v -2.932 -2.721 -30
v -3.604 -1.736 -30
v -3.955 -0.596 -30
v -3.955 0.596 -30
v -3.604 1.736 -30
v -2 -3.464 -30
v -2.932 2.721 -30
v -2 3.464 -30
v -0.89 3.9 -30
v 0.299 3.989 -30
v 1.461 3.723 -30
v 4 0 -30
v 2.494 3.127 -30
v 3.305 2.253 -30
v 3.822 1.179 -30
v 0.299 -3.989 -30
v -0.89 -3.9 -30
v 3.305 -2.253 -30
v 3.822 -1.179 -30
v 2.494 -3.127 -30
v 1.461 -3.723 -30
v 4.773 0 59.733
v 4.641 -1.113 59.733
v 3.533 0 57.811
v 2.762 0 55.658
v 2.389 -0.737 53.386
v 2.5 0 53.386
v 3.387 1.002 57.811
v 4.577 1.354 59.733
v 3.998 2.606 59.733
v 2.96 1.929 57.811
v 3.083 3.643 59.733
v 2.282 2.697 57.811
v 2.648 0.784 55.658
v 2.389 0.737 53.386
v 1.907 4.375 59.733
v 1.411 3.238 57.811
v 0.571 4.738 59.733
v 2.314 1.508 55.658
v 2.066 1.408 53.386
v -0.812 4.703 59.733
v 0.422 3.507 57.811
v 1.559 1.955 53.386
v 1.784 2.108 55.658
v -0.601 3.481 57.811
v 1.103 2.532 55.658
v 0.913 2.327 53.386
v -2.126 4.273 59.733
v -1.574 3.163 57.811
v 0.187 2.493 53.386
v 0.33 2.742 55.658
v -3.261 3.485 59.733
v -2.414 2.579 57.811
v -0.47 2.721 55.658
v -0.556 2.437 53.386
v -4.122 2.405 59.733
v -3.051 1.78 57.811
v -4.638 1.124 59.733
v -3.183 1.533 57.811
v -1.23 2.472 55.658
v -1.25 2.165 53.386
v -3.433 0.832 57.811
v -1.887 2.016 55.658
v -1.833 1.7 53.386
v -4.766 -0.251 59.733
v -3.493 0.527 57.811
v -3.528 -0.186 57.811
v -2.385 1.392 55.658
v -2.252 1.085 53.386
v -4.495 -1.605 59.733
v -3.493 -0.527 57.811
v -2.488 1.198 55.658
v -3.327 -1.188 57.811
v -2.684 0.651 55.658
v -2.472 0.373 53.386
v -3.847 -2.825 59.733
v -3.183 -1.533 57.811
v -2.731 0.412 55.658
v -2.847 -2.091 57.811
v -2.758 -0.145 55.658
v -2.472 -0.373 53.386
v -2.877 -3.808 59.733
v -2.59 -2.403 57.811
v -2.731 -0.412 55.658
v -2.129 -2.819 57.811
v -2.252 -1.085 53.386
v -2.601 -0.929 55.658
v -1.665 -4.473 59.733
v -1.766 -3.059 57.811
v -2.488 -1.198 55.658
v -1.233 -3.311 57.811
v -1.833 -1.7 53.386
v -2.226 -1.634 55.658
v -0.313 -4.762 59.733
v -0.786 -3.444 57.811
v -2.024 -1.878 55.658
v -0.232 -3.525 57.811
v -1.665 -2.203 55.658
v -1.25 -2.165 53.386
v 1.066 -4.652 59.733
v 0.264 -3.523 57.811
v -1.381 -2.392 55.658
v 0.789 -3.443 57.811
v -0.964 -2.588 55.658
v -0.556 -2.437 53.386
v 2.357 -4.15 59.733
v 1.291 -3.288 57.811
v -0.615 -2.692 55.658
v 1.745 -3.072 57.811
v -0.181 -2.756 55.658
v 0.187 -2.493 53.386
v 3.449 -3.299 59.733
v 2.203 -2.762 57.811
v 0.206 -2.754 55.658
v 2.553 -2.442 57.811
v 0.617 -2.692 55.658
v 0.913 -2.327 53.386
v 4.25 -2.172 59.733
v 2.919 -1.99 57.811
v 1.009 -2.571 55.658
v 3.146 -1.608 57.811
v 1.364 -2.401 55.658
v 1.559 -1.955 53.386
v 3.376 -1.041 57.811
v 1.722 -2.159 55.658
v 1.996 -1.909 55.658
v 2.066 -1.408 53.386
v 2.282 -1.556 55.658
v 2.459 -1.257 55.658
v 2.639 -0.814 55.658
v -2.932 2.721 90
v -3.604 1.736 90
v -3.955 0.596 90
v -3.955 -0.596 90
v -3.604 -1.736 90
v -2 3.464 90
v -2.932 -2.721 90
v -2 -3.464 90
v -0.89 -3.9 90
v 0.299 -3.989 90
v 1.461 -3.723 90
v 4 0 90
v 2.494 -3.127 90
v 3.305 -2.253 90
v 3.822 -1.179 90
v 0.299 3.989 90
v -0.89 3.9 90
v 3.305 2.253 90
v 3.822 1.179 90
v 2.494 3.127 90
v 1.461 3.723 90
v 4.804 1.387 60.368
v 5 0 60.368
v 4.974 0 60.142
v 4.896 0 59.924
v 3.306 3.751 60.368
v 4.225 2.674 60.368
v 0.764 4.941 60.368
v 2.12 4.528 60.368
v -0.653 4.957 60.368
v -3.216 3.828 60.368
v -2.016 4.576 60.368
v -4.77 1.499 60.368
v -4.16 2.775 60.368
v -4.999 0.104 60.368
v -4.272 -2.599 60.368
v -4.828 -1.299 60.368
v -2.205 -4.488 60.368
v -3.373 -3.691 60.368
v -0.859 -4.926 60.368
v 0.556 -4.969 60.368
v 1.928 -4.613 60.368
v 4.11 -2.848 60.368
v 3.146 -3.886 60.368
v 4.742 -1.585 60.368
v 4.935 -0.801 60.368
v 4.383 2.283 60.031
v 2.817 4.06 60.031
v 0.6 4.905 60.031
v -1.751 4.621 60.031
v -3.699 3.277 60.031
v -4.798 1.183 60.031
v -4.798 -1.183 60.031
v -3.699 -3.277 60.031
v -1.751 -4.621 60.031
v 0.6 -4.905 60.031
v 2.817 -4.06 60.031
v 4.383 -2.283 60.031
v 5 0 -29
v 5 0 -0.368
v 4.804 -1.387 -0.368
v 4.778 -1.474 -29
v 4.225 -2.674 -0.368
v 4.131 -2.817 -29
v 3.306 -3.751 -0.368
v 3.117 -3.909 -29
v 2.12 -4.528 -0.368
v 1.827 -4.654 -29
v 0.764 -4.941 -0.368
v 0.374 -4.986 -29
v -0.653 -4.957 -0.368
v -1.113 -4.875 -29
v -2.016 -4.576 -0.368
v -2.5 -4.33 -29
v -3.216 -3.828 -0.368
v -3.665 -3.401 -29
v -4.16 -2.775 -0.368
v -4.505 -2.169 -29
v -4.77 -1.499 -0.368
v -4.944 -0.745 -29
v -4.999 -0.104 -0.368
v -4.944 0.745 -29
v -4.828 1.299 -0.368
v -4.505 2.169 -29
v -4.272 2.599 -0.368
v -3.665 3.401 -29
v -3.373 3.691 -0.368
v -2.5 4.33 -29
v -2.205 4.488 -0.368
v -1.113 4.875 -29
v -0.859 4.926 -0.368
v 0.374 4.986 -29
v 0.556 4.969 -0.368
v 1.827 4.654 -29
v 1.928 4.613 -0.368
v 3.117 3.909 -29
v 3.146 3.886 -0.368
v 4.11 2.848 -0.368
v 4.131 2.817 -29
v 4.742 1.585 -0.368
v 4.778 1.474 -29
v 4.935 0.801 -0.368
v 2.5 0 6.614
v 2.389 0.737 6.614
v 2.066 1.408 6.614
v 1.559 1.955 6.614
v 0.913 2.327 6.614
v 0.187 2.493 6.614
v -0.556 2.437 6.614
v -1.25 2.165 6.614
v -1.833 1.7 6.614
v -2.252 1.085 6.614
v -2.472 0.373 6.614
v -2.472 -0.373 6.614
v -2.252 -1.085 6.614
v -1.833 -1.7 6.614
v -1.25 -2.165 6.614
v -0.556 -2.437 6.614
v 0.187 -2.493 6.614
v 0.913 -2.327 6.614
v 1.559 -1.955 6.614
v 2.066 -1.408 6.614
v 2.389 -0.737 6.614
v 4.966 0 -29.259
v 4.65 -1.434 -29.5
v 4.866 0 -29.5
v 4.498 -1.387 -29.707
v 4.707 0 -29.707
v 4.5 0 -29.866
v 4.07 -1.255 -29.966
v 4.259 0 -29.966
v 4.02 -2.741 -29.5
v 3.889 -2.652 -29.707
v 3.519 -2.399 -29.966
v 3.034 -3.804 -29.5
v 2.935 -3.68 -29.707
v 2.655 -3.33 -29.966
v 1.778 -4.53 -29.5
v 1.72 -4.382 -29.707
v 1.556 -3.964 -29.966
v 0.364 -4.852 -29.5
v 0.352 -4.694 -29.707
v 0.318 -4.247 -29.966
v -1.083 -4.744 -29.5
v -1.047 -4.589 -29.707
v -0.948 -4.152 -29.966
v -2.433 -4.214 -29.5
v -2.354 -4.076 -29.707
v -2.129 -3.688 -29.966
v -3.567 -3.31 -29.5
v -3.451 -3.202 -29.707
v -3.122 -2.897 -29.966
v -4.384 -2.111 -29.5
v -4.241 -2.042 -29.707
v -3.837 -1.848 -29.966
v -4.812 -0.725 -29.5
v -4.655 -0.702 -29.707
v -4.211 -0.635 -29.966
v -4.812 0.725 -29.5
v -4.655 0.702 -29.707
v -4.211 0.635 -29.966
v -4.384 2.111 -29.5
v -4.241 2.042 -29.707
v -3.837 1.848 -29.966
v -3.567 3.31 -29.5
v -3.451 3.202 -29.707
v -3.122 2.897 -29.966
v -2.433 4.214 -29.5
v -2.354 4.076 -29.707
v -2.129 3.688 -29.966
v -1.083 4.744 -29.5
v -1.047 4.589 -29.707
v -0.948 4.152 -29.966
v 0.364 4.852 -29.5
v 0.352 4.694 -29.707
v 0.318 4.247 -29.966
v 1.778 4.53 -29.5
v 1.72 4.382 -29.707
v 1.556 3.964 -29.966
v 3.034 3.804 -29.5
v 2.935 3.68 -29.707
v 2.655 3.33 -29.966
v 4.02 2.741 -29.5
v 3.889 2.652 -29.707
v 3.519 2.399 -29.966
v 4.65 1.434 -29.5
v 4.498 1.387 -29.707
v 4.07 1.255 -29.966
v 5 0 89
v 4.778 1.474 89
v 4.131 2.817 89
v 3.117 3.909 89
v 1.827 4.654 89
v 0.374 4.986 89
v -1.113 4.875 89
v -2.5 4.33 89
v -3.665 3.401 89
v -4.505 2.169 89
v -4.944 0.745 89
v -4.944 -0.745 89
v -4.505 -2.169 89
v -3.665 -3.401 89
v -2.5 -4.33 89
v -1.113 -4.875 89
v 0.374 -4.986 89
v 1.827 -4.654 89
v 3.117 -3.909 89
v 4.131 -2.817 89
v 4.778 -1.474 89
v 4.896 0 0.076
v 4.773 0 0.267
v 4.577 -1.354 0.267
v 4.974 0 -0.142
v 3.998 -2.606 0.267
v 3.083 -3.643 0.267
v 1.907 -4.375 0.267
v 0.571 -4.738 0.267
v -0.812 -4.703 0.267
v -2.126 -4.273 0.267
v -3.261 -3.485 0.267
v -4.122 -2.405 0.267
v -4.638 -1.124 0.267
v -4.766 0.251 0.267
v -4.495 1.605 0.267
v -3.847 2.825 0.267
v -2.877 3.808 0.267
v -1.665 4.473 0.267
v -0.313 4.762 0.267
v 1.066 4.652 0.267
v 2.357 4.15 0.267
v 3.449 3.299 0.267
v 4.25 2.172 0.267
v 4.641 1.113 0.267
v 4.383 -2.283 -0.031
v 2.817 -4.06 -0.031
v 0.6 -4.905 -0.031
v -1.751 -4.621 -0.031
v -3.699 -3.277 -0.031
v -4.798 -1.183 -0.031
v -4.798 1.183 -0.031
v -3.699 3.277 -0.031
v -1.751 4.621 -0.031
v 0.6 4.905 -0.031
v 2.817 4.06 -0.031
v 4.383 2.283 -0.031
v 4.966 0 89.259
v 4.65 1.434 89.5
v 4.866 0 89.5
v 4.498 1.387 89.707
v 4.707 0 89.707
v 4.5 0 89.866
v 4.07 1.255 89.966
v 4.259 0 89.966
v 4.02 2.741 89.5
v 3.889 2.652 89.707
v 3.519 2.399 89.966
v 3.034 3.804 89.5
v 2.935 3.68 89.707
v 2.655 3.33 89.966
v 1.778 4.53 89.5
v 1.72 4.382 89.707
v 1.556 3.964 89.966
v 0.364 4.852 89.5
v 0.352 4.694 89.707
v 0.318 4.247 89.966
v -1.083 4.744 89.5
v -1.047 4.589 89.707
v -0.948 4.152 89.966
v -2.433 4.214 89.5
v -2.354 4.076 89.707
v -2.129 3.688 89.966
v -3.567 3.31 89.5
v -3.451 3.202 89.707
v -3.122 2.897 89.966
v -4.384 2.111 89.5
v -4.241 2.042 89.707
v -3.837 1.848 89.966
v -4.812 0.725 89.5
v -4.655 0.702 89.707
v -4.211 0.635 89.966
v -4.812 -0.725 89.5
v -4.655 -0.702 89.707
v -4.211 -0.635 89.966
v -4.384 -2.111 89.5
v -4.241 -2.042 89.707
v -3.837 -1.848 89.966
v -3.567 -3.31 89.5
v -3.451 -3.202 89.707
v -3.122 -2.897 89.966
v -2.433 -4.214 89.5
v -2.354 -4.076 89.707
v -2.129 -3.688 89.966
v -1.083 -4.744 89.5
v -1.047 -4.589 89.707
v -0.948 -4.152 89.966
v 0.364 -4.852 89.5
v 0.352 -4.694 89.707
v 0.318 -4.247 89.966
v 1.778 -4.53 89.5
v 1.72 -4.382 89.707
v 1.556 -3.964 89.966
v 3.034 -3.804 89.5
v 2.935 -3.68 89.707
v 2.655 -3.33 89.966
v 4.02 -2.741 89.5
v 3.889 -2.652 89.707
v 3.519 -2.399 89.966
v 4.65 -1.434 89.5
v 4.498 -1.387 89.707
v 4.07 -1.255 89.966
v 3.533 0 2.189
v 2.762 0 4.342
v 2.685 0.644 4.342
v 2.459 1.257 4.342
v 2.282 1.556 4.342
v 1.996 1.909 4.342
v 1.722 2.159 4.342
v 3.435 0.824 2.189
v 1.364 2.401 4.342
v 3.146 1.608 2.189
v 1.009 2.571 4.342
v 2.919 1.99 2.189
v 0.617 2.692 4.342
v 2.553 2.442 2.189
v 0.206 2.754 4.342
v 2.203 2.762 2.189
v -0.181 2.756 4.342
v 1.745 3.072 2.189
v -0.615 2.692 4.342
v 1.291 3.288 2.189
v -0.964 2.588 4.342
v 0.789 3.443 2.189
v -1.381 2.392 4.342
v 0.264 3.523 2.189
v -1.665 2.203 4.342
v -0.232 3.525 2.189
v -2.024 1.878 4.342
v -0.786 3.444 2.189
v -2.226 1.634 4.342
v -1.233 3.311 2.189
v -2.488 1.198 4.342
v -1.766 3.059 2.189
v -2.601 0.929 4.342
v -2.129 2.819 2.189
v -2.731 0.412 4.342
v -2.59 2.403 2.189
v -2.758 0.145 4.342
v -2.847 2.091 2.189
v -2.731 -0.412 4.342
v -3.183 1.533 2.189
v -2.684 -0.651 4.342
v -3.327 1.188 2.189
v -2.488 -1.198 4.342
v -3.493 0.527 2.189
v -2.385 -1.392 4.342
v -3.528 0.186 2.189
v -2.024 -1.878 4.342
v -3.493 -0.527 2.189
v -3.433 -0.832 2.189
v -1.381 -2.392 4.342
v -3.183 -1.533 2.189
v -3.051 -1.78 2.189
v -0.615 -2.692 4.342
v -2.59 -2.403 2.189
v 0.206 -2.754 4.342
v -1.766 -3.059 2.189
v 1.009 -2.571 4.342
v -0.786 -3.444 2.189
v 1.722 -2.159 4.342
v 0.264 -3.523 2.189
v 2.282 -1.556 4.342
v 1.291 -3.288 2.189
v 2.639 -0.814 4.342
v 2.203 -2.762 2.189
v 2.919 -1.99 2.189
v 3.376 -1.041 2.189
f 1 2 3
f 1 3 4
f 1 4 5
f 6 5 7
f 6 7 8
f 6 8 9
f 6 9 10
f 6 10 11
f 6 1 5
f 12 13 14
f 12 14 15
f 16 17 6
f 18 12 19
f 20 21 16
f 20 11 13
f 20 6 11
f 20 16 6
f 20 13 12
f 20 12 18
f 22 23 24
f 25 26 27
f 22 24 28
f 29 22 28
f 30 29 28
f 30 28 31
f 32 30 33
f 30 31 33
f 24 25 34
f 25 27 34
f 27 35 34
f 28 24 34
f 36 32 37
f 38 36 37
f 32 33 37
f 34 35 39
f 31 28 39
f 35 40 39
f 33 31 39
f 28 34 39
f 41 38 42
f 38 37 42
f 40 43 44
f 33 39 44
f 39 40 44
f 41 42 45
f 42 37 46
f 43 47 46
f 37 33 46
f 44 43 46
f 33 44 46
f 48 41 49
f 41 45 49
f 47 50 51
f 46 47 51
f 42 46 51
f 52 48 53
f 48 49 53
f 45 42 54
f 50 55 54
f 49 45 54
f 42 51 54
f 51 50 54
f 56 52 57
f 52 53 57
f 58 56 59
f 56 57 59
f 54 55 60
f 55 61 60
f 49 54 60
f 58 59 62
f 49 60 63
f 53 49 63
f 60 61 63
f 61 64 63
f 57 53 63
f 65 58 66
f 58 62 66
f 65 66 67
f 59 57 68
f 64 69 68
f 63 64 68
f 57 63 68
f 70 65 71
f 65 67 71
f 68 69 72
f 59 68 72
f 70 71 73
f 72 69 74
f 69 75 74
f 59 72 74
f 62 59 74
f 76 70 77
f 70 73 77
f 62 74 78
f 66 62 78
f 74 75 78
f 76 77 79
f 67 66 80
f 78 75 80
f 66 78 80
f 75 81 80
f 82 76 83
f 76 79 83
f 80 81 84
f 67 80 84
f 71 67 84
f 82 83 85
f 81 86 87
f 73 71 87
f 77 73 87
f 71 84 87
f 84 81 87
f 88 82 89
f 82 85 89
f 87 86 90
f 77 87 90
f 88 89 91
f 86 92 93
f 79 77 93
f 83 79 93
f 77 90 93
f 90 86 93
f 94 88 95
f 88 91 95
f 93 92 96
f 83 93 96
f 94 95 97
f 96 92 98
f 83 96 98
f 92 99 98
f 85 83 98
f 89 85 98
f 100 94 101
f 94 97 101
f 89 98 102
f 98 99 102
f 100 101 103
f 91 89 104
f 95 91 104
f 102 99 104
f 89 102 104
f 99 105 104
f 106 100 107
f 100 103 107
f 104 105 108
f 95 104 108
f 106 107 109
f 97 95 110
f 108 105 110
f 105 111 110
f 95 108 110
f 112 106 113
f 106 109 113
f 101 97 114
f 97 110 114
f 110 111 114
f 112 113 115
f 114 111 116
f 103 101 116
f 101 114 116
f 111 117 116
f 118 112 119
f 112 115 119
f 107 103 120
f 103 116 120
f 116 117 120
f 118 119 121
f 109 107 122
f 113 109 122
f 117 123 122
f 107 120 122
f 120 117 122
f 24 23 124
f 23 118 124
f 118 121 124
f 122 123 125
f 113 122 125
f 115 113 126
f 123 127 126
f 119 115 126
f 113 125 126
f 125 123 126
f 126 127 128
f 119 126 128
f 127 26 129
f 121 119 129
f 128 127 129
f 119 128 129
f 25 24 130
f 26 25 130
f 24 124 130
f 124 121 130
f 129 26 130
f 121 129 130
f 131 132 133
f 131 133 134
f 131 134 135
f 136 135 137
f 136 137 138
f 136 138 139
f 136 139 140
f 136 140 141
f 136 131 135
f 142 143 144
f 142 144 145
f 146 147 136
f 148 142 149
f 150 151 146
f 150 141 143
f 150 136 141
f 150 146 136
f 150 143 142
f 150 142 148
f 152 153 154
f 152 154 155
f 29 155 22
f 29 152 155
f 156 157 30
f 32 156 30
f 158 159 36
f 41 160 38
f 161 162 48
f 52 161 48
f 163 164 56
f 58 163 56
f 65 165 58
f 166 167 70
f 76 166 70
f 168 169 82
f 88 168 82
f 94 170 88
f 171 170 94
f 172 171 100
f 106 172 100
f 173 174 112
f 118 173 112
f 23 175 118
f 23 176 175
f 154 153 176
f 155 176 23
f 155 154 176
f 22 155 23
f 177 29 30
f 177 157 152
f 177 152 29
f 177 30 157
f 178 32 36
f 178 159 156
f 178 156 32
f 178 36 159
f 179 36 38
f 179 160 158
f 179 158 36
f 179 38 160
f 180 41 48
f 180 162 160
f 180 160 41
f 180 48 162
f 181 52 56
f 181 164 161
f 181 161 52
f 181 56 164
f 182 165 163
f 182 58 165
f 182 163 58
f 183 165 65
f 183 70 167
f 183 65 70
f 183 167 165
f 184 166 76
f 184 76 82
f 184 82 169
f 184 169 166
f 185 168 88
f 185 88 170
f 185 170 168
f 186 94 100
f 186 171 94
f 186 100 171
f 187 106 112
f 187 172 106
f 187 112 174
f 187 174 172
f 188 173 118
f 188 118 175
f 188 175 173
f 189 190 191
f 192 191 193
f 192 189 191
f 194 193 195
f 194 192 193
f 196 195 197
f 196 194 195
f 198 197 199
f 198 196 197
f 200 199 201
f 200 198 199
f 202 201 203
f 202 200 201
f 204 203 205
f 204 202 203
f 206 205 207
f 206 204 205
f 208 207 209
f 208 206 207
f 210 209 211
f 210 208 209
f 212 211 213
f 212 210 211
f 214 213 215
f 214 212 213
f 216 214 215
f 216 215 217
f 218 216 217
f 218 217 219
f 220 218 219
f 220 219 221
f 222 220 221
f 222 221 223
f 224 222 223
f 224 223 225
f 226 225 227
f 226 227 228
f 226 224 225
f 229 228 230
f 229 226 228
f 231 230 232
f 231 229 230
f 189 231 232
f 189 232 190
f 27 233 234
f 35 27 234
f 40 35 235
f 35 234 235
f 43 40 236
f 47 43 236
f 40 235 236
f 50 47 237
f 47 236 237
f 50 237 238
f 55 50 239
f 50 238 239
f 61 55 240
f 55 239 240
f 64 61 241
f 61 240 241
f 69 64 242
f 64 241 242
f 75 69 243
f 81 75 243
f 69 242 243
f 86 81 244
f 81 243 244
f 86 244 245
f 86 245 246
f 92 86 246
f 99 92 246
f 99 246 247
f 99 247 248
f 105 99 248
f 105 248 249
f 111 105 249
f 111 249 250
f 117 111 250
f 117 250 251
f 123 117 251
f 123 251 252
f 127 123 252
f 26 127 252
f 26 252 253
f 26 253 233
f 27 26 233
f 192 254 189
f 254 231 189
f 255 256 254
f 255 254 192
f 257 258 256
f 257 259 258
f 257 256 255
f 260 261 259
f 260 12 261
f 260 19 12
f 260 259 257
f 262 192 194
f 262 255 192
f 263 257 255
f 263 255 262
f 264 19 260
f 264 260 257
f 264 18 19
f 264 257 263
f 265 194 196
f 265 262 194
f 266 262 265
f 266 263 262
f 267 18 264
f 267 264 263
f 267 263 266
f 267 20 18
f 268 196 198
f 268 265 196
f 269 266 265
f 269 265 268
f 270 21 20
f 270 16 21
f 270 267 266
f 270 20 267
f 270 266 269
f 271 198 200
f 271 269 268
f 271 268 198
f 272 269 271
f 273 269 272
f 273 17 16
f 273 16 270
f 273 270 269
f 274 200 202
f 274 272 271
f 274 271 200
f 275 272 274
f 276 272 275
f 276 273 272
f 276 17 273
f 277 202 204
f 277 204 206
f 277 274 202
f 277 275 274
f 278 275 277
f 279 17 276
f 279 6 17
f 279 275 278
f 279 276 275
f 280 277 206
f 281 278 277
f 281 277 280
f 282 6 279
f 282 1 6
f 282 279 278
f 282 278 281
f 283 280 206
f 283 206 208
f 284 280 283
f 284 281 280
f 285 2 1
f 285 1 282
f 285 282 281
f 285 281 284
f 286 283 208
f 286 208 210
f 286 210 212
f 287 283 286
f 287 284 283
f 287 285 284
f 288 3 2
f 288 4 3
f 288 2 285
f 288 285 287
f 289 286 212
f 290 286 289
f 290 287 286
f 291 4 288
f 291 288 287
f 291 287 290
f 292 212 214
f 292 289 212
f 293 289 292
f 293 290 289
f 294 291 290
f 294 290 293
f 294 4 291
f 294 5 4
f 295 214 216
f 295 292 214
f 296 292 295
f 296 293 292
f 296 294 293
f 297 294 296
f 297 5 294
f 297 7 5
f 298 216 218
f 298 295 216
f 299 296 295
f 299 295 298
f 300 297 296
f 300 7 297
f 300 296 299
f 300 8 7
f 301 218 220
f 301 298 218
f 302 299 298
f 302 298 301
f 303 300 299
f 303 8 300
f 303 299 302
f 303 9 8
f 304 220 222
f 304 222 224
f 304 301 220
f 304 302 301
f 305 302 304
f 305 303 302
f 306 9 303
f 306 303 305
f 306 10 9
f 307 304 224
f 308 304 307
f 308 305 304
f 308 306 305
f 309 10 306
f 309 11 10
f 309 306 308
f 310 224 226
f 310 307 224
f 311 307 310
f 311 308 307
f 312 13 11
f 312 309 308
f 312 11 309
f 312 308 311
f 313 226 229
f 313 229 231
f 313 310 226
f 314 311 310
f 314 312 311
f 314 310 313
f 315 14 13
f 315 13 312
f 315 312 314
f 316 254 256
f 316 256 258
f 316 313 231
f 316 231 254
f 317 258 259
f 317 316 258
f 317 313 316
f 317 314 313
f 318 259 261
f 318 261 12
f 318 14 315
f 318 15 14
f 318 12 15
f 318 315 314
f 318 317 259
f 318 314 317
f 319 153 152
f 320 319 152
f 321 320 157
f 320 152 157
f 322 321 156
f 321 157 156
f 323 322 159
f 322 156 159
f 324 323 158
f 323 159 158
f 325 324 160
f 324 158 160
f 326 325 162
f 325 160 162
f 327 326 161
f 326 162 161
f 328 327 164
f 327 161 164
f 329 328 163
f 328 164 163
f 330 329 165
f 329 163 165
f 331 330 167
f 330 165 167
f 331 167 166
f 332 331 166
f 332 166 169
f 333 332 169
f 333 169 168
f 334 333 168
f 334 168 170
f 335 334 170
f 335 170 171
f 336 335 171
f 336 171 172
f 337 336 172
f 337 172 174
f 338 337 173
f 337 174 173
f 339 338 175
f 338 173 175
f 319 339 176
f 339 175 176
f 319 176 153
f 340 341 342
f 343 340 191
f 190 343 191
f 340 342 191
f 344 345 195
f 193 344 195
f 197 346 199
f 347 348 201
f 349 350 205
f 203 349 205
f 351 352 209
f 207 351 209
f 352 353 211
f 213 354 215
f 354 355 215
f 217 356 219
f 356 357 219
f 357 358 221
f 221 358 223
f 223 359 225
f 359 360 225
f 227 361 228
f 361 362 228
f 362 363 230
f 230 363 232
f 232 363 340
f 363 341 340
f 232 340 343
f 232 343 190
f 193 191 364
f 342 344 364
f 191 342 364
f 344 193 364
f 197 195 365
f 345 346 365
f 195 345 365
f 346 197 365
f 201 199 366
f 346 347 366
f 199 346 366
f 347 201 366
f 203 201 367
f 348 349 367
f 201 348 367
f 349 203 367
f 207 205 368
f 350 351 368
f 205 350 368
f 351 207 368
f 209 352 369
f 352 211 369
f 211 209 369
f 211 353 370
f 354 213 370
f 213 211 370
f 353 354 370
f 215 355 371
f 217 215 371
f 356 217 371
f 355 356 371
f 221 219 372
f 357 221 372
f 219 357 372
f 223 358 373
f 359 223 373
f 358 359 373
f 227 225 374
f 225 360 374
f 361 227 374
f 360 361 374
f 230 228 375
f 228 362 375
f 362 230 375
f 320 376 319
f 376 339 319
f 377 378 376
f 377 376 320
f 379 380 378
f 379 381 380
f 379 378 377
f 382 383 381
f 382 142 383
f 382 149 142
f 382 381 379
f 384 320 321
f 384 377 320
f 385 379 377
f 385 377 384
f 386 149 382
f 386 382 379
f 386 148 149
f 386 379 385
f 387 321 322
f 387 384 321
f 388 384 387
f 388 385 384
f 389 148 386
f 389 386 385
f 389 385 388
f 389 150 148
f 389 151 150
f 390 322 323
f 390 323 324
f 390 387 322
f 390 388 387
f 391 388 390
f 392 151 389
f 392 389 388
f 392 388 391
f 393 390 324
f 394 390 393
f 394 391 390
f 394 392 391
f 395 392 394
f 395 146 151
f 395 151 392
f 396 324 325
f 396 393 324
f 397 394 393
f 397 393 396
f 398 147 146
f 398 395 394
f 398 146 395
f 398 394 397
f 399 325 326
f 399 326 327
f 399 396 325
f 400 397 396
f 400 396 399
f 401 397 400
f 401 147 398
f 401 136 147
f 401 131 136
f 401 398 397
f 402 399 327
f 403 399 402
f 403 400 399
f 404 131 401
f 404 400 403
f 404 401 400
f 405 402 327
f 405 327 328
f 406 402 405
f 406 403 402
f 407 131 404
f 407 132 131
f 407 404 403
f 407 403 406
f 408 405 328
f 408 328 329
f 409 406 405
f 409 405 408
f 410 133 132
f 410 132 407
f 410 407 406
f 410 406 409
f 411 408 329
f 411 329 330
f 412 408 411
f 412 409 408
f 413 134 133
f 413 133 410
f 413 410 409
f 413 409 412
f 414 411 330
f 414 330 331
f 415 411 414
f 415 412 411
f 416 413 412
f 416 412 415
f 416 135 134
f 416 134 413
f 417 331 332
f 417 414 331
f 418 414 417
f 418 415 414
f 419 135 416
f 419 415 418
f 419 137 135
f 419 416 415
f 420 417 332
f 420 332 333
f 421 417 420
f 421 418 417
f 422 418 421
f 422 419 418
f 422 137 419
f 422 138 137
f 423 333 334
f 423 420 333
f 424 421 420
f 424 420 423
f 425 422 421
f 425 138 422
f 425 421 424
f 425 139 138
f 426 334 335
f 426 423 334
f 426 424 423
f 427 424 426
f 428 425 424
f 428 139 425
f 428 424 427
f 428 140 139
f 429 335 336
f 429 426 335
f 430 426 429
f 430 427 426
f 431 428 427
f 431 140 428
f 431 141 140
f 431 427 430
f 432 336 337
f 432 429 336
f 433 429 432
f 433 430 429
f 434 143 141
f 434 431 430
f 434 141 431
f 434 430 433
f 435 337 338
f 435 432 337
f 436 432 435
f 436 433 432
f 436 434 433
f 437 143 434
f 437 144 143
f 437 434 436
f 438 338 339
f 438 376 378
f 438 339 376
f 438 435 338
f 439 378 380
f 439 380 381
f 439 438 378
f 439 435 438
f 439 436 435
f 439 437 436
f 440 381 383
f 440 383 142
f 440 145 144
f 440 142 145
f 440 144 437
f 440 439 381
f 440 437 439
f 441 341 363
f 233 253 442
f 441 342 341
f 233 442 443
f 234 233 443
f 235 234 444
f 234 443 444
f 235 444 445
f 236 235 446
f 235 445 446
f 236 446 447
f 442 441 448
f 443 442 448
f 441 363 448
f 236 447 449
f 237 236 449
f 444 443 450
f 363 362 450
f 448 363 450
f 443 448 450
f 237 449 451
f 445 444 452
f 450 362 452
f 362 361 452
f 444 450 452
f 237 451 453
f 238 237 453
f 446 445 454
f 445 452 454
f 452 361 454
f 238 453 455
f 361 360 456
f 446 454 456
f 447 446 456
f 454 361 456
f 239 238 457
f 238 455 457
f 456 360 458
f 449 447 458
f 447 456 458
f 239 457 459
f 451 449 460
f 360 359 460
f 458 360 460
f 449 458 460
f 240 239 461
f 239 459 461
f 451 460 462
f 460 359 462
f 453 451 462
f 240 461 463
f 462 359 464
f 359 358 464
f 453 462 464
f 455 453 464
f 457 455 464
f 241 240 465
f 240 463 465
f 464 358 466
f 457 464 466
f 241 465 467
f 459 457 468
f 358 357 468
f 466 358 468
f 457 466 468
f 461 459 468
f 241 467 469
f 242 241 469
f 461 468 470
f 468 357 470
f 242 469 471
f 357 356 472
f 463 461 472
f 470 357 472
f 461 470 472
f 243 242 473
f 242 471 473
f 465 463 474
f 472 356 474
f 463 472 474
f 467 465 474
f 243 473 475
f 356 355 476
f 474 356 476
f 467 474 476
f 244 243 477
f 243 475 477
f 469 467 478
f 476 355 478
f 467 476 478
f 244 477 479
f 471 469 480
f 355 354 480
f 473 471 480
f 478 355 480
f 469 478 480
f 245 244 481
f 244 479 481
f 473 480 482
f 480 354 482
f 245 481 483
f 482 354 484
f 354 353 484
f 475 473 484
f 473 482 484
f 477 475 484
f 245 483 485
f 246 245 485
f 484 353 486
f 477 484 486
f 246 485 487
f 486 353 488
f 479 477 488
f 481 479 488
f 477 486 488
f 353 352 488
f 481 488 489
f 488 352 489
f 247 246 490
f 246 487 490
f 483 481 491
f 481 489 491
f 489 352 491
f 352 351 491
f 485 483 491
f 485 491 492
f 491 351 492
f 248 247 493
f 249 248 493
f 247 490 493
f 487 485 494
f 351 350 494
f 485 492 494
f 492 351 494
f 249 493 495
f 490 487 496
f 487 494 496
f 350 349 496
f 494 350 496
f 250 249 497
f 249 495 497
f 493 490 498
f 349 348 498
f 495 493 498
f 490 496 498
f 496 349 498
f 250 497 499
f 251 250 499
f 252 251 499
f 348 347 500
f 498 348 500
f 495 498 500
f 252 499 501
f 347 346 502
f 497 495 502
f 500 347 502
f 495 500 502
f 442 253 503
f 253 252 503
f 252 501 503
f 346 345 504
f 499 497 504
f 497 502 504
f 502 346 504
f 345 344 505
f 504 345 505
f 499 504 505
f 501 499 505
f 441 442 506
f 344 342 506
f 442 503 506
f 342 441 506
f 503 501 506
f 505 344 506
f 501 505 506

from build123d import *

# Parameters (mm, degrees)
SKETCH_1_R      = 2.5
EXTRUDE_1_DEPTH = 60
SKETCH_2_R      = 5
EXTRUDE_2_DEPTH = 30
EXTRUDE_START   = 30
SKETCH_3_R      = 5
EXTRUDE_3_DEPTH = 30
FILLET_2_R      = 10
FILLET_3_R      = 1
FILLET_4_R      = 1


with BuildPart() as part:
    # 草圖1 → 填料-伸長1 (new body)
    with BuildSketch(Plane.XY):
        Circle(SKETCH_1_R)
    extrude(amount=EXTRUDE_1_DEPTH)

    # 草圖2 → 填料-伸長2 (add)
    with BuildSketch(Plane.XY.offset(60)):
        Circle(SKETCH_2_R)
    extrude(amount=EXTRUDE_2_DEPTH)

    # 草圖3 → 填料-伸長3 (add)
    with BuildSketch(Plane(origin=(0, 0, 0), x_dir=(-1, 0, 0), z_dir=(0, 0, -1)).offset(EXTRUDE_START)):
        with Locations(Location((0, 0, 0), (0, 0, 180))):
            Circle(SKETCH_3_R)
    extrude(amount=-EXTRUDE_3_DEPTH)

    # 圓角2
    # the kernel refuses this fillet: 10 mm, written as the material it adds along each edge
    with BuildSketch(Plane(origin=(0, 0, 0), x_dir=(1, 0, 0), z_dir=(0, -1, 0))) as fillet_2_piece_1:
        with BuildLine():
            CenterArc((12.5, 6.614378278), FILLET_2_R, 180, 41.409622109)
            Line((2.5, 6.614378278), (2.3, 6.614378278))
            Line((2.3, 6.614378278), (2.3, 0))
            Line((2.3, 0), (2.5, -0.2))
            ThreePointArc((2.5, -0.2), (3.75, -0.2), (4.85, -0.132287566))
            Line((4.85, -0.132287566), (5, 0))
        make_face()
    revolve(axis=Axis((0, 0, 0), (0, 0, 1)))
    with BuildSketch(Plane(origin=(0, 0, 60), x_dir=(1, 0, 0), z_dir=(0, -1, 0))) as fillet_2_piece_2:
        with BuildLine():
            CenterArc((12.5, -6.614378278), FILLET_2_R, 138.590377891, 41.409622109)
            Line((5, 0), (4.85, 0.132287566))
            ThreePointArc((4.85, 0.132287566), (3.75, 0.2), (2.5, 0.2))
            Line((2.5, 0.2), (2.3, 0))
            Line((2.3, 0), (2.3, -6.614378278))
            Line((2.3, -6.614378278), (2.5, -6.614378278))
        make_face()
    revolve(axis=Axis((0, 0, 60), (0, 0, 1)))

    # 圓角3
    fillet_3_edges = [part.edges().sort_by_distance(p)[0] for p in [
        (-5, 0, -30),
        (-5, 0, 90),
    ]]
    fillet(fillet_3_edges, radius=FILLET_3_R)

    # 圓角4
    fillet_4_edges = [part.edges().sort_by_distance(p)[0] for p in [
        (-5, 0, 0),
        (-5, 0, 60),
    ]]
    fillet(fillet_4_edges, radius=FILLET_4_R)


solid = part.part
